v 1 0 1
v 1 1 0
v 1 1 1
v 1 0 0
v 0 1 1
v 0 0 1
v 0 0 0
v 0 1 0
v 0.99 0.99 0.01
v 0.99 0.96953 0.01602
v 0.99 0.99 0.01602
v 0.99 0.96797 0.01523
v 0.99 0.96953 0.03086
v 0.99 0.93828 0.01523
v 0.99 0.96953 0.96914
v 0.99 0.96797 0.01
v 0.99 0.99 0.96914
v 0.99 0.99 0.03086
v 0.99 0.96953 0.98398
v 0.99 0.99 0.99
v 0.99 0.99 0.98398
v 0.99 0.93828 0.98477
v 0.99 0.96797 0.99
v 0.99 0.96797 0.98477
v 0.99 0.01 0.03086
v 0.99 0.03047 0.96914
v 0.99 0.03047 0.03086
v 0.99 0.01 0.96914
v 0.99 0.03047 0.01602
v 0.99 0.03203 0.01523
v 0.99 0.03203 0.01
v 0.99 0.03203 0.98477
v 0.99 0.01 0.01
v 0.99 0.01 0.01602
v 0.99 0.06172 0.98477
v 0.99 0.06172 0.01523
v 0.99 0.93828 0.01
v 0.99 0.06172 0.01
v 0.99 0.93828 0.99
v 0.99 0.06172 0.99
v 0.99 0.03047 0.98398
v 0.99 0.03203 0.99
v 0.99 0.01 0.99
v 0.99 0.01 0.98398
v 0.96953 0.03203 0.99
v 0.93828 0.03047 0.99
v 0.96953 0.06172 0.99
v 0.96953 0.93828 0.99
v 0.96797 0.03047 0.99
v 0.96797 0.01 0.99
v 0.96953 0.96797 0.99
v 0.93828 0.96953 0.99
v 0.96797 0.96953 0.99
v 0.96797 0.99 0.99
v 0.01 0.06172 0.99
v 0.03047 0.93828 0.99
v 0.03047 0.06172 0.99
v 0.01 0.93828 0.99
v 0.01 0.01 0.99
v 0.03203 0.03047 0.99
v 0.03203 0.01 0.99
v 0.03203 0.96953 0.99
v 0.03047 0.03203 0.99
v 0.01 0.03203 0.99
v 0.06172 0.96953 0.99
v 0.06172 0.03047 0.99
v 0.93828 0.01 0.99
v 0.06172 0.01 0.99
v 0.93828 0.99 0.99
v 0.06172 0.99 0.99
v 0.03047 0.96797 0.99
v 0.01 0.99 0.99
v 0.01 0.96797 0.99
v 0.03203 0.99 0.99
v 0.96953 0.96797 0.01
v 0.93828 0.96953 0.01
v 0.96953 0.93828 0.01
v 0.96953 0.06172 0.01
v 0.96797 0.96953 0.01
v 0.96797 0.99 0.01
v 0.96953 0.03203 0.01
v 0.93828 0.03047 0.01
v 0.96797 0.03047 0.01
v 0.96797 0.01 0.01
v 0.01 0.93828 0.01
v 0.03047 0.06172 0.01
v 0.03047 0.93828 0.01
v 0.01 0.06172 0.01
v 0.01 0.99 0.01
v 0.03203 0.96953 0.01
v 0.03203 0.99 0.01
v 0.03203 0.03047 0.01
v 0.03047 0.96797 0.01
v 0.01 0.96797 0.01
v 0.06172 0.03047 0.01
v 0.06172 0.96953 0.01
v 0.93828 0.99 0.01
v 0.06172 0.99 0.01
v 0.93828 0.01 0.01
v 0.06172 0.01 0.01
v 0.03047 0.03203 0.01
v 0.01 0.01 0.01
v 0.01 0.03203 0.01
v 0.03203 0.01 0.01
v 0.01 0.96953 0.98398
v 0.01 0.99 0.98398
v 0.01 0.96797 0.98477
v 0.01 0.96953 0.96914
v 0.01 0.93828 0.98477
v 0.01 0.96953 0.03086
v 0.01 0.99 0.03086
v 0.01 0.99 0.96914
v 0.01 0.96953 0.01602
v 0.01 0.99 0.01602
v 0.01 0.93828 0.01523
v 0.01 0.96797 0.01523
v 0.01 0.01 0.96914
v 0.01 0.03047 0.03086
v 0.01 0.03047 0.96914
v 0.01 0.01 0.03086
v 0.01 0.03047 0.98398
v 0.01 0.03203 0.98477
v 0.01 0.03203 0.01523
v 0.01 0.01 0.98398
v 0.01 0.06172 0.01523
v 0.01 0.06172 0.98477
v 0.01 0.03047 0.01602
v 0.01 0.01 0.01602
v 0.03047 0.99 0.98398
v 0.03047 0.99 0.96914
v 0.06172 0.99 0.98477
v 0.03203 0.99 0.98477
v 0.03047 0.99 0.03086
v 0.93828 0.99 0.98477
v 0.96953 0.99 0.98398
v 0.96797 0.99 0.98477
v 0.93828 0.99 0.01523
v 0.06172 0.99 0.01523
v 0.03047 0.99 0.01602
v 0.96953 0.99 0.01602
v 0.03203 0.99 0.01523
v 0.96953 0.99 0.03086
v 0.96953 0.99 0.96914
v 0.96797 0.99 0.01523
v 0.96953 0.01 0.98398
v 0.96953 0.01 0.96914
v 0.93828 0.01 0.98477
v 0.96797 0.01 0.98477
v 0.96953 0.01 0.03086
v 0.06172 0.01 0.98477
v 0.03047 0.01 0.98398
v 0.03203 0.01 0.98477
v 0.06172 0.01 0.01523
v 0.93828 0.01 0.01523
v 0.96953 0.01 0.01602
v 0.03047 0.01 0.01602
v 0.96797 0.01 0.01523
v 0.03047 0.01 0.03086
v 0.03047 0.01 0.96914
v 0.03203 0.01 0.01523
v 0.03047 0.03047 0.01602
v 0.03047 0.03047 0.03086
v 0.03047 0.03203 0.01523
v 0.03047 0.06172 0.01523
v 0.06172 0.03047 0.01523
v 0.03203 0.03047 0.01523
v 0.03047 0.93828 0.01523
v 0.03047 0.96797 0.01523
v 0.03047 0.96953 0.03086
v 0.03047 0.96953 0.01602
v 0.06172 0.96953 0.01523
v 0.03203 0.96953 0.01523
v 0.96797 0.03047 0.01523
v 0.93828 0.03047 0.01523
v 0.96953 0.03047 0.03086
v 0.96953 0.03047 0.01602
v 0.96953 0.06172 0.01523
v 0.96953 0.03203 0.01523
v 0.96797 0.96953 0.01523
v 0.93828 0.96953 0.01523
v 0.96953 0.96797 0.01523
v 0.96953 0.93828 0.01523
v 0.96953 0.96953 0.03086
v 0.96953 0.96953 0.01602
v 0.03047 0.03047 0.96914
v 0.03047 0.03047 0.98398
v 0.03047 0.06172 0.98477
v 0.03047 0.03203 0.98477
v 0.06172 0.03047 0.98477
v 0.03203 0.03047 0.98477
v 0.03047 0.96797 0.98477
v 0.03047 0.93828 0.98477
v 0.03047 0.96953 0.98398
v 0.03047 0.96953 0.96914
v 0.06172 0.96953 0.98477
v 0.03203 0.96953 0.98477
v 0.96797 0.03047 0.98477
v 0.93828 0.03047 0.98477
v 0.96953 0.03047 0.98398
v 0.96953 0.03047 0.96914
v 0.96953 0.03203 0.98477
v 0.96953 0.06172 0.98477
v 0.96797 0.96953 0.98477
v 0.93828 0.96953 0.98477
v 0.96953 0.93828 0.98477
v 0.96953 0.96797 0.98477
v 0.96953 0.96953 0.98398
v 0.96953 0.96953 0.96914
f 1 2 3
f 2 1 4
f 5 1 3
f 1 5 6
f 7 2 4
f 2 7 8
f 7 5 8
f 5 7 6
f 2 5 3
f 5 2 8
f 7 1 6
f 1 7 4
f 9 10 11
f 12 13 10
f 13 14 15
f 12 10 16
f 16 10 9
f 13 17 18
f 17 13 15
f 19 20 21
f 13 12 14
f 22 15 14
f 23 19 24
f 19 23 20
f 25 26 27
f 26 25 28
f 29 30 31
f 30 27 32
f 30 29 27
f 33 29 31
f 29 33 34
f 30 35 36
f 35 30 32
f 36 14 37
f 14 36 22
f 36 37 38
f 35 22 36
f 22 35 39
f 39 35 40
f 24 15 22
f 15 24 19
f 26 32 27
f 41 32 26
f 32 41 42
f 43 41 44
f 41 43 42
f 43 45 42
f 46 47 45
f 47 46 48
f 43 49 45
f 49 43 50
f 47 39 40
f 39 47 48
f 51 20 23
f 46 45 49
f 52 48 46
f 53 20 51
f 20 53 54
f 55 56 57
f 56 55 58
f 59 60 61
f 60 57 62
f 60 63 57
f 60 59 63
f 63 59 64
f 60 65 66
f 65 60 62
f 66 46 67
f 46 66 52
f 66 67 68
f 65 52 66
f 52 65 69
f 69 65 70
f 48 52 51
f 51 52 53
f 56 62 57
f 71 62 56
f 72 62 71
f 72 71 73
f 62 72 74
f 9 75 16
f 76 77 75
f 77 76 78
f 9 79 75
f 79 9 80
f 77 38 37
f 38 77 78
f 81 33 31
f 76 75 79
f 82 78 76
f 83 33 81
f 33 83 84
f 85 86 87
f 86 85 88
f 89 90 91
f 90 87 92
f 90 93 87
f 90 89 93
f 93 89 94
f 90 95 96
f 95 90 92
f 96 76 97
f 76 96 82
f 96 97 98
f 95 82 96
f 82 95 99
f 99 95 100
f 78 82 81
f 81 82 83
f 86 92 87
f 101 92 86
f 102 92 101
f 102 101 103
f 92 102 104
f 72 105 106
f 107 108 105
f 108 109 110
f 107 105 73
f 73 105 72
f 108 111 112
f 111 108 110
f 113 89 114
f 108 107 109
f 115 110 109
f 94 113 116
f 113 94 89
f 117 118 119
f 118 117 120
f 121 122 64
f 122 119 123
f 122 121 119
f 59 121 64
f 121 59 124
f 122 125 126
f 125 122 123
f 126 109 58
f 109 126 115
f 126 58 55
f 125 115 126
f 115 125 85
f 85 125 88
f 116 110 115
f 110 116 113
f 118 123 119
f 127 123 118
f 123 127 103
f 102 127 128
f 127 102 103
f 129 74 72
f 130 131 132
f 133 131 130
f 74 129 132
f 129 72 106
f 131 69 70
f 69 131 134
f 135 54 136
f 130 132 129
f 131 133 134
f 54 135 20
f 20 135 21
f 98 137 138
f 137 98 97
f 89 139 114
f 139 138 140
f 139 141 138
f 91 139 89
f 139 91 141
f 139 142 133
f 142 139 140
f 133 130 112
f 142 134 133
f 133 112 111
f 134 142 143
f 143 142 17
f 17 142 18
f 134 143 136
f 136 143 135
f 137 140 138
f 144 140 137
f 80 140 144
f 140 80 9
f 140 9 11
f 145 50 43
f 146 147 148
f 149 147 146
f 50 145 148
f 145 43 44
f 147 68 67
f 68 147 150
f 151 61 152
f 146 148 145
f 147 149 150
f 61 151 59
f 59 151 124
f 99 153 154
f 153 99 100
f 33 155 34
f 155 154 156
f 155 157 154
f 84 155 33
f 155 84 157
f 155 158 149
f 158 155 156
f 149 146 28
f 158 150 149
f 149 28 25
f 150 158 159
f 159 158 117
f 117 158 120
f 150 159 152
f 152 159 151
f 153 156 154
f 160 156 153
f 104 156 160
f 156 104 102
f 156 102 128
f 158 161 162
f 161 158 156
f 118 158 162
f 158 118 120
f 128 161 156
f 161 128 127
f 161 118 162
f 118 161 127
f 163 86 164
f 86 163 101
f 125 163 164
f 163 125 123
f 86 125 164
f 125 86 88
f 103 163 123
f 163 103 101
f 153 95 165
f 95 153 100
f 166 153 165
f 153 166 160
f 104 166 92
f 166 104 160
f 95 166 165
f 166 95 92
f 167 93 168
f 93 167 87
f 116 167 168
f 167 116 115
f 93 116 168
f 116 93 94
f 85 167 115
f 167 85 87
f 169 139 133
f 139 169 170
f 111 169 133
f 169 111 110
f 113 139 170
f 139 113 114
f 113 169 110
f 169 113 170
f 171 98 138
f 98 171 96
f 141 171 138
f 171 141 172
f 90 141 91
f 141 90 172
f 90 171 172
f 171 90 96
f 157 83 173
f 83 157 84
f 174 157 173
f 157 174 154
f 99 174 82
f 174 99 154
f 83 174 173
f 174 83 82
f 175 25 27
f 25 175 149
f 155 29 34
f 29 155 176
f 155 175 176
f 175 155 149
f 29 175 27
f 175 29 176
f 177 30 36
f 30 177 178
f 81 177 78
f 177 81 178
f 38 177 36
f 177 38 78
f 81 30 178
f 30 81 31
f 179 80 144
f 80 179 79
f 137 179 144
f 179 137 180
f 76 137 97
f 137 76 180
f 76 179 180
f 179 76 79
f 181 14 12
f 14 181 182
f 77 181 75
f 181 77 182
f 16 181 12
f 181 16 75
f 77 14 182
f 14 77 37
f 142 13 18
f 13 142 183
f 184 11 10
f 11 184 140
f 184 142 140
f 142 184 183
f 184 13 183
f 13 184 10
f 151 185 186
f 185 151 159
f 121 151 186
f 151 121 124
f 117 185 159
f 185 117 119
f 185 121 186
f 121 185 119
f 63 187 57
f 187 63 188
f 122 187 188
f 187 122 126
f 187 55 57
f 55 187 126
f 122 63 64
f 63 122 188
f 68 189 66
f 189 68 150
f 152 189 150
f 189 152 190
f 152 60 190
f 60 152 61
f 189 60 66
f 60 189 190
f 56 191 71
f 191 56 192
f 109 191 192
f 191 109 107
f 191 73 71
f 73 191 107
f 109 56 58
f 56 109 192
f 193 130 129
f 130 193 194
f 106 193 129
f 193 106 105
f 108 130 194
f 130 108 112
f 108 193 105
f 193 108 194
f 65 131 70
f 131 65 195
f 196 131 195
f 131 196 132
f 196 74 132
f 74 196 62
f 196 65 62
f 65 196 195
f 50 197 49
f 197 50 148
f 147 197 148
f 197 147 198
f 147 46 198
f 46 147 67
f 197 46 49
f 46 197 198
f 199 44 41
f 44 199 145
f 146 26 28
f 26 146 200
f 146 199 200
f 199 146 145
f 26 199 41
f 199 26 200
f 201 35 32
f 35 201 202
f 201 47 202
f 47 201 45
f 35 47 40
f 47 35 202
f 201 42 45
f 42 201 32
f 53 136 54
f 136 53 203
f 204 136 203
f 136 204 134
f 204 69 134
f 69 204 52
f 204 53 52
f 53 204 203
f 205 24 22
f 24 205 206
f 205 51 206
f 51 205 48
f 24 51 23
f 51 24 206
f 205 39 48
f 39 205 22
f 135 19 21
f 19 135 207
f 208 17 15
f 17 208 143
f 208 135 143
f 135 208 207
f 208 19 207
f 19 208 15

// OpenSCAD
translate([0.015625, 0.015625, 0.0234375]) color([0.39833072283451443, 0.21941678928797392, 0.5639138372280843]) cube([0.0296875, 0.0296875, 0.01484375], center=true);
translate([0.015625, 0.046875, 0.0078125]) color([0.618394899456581, 0.8950868857513247, 0.7563610889157508]) cube([0.0296875, 0.0296875, 0.01484375], center=true);
translate([0.046875, 0.015625, 0.0078125]) color([0.7641855912778069, 0.3472510852601779, 0.8881857139460047]) cube([0.0296875, 0.0296875, 0.01484375], center=true);
translate([0.015625, 0.953125, 0.0078125]) color([0.9402249758325596, 0.3445043156838917, 0.14797057547585069]) cube([0.0296875, 0.0296875, 0.01484375], center=true);
translate([0.015625, 0.984375, 0.0234375]) color([0.6731398456332206, 0.07847097514654666, 0.7705092524073209]) cube([0.0296875, 0.0296875, 0.01484375], center=true);
translate([0.046875, 0.984375, 0.0078125]) color([0.5627111221719018, 0.07039204952808831, 0.23204881571097935]) cube([0.0296875, 0.0296875, 0.01484375], center=true);
translate([0.953125, 0.015625, 0.0078125]) color([0.84311110776846, 0.5447869781582535, 0.4022573068343398]) cube([0.0296875, 0.0296875, 0.01484375], center=true);
translate([0.984375, 0.015625, 0.0234375]) color([0.23770839731955729, 0.978979105949347, 0.6355565188194888]) cube([0.0296875, 0.0296875, 0.01484375], center=true);
translate([0.984375, 0.046875, 0.0078125]) color([0.8509073385153657, 0.6711750703216487, 0.49366640486958635]) cube([0.0296875, 0.0296875, 0.01484375], center=true);
translate([0.953125, 0.984375, 0.0078125]) color([0.9999392037312226, 0.6353356976321728, 0.7400087078800163]) cube([0.0296875, 0.0296875, 0.01484375], center=true);
translate([0.984375, 0.953125, 0.0078125]) color([0.43780520073865803, 0.6619839377424468, 0.9749311227988616]) cube([0.0296875, 0.0296875, 0.01484375], center=true);
translate([0.984375, 0.984375, 0.0234375]) color([0.1036714942897149, 0.31422883938711865, 0.17657605509320162]) cube([0.0296875, 0.0296875, 0.01484375], center=true);
translate([0.015625, 0.015625, 0.9765625]) color([0.8173441973693325, 0.853748395401874, 0.4884020219672923]) cube([0.0296875, 0.0296875, 0.01484375], center=true);
translate([0.015625, 0.046875, 0.9921875]) color([0.834998650042315, 0.081145893512381, 0.3894732711723312]) cube([0.0296875, 0.0296875, 0.01484375], center=true);
translate([0.046875, 0.015625, 0.9921875]) color([0.8098862373281673, 0.9917865333213375, 0.8764232879841029]) cube([0.0296875, 0.0296875, 0.01484375], center=true);
translate([0.015625, 0.953125, 0.9921875]) color([0.9695087206654849, 0.08287485488711577, 0.8029390376034558]) cube([0.0296875, 0.0296875, 0.01484375], center=true);
translate([0.015625, 0.984375, 0.9765625]) color([0.14209139313005814, 0.32361630216606796, 0.42250370370966617]) cube([0.0296875, 0.0296875, 0.01484375], center=true);
translate([0.046875, 0.984375, 0.9921875]) color([0.48745944022630994, 0.8195476313999496, 0.8814681505139011]) cube([0.0296875, 0.0296875, 0.01484375], center=true);
translate([0.953125, 0.015625, 0.9921875]) color([0.433174176403779, 0.05999604878187903, 0.7824575050547853]) cube([0.0296875, 0.0296875, 0.01484375], center=true);
translate([0.984375, 0.015625, 0.9765625]) color([0.4889425108125114, 0.4094309817729431, 0.016588416492966607]) cube([0.0296875, 0.0296875, 0.01484375], center=true);
translate([0.984375, 0.046875, 0.9921875]) color([0.057084046136792854, 0.4610491215197915, 0.7107838355398934]) cube([0.0296875, 0.0296875, 0.01484375], center=true);
translate([0.953125, 0.984375, 0.9921875]) color([0.5706515103854932, 0.07194011752521012, 0.34264503990088524]) cube([0.0296875, 0.0296875, 0.01484375], center=true);
translate([0.984375, 0.953125, 0.9921875]) color([0.591118568658282, 0.3281694226989639, 0.6443198690218486]) cube([0.0296875, 0.0296875, 0.01484375], center=true);
translate([0.984375, 0.984375, 0.9765625]) color([0.838692586617018, 0.40913403983355934, 0.3197800744064646]) cube([0.0296875, 0.0296875, 0.01484375], center=true);
color([0.3,0.3,0.3,0.3]) difference() { cube([1,1,1]); translate([0.01,0.01,0.01]) cube([0.98,0.98,0.98]); }
